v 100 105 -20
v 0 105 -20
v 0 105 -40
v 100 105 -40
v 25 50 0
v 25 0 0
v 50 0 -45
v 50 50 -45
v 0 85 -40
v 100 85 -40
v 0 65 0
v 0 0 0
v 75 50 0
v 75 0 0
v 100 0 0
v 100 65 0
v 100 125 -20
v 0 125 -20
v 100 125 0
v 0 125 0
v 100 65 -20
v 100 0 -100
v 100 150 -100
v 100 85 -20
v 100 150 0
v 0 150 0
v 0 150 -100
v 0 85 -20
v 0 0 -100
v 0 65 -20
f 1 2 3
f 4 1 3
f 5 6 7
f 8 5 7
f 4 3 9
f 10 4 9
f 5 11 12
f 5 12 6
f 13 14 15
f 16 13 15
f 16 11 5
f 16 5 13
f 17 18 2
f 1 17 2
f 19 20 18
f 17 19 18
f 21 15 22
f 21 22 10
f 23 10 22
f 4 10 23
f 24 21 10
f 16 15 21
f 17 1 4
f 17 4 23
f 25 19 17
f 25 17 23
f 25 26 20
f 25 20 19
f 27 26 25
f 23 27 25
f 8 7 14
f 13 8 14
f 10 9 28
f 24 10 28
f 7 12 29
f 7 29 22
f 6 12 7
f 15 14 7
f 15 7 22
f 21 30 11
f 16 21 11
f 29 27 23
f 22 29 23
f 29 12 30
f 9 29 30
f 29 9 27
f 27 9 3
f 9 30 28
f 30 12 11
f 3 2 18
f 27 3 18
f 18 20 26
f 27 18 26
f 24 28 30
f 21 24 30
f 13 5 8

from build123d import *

# Parameters (mm, degrees)
SKETCH1_W           = 100
SKETCH1_H           = 150
BOSS_EXTRUDE1_DEPTH = 100
CUT_EXTRUDE1_DEPTH  = 50
CUT_EXTRUDE2_DEPTH  = 207.155281281


with BuildPart() as part:
    # Sketch1 → Boss-Extrude1 (new body)
    with BuildSketch(Plane.XY):
        with Locations((50, 75)):
            Rectangle(SKETCH1_W, SKETCH1_H)
    extrude(amount=-BOSS_EXTRUDE1_DEPTH)

    # Sketch2 → Cut-Extrude1 (cut)
    with BuildSketch(Plane.XZ):
        Polygon((25, 0), (50, -45), (75, 0), align=None)
    extrude(amount=-CUT_EXTRUDE1_DEPTH, mode=Mode.SUBTRACT)

    # Sketch3 → Cut-Extrude2 (cut, through all)
    with BuildSketch(Plane.ZY):
        Polygon((0, 125), (-20, 125), (-20, 105), (-40, 105), (-40, 85), (-20, 85), (-20, 65), (0, 65), align=None)
    extrude(amount=-CUT_EXTRUDE2_DEPTH, mode=Mode.SUBTRACT)


solid = part.part
